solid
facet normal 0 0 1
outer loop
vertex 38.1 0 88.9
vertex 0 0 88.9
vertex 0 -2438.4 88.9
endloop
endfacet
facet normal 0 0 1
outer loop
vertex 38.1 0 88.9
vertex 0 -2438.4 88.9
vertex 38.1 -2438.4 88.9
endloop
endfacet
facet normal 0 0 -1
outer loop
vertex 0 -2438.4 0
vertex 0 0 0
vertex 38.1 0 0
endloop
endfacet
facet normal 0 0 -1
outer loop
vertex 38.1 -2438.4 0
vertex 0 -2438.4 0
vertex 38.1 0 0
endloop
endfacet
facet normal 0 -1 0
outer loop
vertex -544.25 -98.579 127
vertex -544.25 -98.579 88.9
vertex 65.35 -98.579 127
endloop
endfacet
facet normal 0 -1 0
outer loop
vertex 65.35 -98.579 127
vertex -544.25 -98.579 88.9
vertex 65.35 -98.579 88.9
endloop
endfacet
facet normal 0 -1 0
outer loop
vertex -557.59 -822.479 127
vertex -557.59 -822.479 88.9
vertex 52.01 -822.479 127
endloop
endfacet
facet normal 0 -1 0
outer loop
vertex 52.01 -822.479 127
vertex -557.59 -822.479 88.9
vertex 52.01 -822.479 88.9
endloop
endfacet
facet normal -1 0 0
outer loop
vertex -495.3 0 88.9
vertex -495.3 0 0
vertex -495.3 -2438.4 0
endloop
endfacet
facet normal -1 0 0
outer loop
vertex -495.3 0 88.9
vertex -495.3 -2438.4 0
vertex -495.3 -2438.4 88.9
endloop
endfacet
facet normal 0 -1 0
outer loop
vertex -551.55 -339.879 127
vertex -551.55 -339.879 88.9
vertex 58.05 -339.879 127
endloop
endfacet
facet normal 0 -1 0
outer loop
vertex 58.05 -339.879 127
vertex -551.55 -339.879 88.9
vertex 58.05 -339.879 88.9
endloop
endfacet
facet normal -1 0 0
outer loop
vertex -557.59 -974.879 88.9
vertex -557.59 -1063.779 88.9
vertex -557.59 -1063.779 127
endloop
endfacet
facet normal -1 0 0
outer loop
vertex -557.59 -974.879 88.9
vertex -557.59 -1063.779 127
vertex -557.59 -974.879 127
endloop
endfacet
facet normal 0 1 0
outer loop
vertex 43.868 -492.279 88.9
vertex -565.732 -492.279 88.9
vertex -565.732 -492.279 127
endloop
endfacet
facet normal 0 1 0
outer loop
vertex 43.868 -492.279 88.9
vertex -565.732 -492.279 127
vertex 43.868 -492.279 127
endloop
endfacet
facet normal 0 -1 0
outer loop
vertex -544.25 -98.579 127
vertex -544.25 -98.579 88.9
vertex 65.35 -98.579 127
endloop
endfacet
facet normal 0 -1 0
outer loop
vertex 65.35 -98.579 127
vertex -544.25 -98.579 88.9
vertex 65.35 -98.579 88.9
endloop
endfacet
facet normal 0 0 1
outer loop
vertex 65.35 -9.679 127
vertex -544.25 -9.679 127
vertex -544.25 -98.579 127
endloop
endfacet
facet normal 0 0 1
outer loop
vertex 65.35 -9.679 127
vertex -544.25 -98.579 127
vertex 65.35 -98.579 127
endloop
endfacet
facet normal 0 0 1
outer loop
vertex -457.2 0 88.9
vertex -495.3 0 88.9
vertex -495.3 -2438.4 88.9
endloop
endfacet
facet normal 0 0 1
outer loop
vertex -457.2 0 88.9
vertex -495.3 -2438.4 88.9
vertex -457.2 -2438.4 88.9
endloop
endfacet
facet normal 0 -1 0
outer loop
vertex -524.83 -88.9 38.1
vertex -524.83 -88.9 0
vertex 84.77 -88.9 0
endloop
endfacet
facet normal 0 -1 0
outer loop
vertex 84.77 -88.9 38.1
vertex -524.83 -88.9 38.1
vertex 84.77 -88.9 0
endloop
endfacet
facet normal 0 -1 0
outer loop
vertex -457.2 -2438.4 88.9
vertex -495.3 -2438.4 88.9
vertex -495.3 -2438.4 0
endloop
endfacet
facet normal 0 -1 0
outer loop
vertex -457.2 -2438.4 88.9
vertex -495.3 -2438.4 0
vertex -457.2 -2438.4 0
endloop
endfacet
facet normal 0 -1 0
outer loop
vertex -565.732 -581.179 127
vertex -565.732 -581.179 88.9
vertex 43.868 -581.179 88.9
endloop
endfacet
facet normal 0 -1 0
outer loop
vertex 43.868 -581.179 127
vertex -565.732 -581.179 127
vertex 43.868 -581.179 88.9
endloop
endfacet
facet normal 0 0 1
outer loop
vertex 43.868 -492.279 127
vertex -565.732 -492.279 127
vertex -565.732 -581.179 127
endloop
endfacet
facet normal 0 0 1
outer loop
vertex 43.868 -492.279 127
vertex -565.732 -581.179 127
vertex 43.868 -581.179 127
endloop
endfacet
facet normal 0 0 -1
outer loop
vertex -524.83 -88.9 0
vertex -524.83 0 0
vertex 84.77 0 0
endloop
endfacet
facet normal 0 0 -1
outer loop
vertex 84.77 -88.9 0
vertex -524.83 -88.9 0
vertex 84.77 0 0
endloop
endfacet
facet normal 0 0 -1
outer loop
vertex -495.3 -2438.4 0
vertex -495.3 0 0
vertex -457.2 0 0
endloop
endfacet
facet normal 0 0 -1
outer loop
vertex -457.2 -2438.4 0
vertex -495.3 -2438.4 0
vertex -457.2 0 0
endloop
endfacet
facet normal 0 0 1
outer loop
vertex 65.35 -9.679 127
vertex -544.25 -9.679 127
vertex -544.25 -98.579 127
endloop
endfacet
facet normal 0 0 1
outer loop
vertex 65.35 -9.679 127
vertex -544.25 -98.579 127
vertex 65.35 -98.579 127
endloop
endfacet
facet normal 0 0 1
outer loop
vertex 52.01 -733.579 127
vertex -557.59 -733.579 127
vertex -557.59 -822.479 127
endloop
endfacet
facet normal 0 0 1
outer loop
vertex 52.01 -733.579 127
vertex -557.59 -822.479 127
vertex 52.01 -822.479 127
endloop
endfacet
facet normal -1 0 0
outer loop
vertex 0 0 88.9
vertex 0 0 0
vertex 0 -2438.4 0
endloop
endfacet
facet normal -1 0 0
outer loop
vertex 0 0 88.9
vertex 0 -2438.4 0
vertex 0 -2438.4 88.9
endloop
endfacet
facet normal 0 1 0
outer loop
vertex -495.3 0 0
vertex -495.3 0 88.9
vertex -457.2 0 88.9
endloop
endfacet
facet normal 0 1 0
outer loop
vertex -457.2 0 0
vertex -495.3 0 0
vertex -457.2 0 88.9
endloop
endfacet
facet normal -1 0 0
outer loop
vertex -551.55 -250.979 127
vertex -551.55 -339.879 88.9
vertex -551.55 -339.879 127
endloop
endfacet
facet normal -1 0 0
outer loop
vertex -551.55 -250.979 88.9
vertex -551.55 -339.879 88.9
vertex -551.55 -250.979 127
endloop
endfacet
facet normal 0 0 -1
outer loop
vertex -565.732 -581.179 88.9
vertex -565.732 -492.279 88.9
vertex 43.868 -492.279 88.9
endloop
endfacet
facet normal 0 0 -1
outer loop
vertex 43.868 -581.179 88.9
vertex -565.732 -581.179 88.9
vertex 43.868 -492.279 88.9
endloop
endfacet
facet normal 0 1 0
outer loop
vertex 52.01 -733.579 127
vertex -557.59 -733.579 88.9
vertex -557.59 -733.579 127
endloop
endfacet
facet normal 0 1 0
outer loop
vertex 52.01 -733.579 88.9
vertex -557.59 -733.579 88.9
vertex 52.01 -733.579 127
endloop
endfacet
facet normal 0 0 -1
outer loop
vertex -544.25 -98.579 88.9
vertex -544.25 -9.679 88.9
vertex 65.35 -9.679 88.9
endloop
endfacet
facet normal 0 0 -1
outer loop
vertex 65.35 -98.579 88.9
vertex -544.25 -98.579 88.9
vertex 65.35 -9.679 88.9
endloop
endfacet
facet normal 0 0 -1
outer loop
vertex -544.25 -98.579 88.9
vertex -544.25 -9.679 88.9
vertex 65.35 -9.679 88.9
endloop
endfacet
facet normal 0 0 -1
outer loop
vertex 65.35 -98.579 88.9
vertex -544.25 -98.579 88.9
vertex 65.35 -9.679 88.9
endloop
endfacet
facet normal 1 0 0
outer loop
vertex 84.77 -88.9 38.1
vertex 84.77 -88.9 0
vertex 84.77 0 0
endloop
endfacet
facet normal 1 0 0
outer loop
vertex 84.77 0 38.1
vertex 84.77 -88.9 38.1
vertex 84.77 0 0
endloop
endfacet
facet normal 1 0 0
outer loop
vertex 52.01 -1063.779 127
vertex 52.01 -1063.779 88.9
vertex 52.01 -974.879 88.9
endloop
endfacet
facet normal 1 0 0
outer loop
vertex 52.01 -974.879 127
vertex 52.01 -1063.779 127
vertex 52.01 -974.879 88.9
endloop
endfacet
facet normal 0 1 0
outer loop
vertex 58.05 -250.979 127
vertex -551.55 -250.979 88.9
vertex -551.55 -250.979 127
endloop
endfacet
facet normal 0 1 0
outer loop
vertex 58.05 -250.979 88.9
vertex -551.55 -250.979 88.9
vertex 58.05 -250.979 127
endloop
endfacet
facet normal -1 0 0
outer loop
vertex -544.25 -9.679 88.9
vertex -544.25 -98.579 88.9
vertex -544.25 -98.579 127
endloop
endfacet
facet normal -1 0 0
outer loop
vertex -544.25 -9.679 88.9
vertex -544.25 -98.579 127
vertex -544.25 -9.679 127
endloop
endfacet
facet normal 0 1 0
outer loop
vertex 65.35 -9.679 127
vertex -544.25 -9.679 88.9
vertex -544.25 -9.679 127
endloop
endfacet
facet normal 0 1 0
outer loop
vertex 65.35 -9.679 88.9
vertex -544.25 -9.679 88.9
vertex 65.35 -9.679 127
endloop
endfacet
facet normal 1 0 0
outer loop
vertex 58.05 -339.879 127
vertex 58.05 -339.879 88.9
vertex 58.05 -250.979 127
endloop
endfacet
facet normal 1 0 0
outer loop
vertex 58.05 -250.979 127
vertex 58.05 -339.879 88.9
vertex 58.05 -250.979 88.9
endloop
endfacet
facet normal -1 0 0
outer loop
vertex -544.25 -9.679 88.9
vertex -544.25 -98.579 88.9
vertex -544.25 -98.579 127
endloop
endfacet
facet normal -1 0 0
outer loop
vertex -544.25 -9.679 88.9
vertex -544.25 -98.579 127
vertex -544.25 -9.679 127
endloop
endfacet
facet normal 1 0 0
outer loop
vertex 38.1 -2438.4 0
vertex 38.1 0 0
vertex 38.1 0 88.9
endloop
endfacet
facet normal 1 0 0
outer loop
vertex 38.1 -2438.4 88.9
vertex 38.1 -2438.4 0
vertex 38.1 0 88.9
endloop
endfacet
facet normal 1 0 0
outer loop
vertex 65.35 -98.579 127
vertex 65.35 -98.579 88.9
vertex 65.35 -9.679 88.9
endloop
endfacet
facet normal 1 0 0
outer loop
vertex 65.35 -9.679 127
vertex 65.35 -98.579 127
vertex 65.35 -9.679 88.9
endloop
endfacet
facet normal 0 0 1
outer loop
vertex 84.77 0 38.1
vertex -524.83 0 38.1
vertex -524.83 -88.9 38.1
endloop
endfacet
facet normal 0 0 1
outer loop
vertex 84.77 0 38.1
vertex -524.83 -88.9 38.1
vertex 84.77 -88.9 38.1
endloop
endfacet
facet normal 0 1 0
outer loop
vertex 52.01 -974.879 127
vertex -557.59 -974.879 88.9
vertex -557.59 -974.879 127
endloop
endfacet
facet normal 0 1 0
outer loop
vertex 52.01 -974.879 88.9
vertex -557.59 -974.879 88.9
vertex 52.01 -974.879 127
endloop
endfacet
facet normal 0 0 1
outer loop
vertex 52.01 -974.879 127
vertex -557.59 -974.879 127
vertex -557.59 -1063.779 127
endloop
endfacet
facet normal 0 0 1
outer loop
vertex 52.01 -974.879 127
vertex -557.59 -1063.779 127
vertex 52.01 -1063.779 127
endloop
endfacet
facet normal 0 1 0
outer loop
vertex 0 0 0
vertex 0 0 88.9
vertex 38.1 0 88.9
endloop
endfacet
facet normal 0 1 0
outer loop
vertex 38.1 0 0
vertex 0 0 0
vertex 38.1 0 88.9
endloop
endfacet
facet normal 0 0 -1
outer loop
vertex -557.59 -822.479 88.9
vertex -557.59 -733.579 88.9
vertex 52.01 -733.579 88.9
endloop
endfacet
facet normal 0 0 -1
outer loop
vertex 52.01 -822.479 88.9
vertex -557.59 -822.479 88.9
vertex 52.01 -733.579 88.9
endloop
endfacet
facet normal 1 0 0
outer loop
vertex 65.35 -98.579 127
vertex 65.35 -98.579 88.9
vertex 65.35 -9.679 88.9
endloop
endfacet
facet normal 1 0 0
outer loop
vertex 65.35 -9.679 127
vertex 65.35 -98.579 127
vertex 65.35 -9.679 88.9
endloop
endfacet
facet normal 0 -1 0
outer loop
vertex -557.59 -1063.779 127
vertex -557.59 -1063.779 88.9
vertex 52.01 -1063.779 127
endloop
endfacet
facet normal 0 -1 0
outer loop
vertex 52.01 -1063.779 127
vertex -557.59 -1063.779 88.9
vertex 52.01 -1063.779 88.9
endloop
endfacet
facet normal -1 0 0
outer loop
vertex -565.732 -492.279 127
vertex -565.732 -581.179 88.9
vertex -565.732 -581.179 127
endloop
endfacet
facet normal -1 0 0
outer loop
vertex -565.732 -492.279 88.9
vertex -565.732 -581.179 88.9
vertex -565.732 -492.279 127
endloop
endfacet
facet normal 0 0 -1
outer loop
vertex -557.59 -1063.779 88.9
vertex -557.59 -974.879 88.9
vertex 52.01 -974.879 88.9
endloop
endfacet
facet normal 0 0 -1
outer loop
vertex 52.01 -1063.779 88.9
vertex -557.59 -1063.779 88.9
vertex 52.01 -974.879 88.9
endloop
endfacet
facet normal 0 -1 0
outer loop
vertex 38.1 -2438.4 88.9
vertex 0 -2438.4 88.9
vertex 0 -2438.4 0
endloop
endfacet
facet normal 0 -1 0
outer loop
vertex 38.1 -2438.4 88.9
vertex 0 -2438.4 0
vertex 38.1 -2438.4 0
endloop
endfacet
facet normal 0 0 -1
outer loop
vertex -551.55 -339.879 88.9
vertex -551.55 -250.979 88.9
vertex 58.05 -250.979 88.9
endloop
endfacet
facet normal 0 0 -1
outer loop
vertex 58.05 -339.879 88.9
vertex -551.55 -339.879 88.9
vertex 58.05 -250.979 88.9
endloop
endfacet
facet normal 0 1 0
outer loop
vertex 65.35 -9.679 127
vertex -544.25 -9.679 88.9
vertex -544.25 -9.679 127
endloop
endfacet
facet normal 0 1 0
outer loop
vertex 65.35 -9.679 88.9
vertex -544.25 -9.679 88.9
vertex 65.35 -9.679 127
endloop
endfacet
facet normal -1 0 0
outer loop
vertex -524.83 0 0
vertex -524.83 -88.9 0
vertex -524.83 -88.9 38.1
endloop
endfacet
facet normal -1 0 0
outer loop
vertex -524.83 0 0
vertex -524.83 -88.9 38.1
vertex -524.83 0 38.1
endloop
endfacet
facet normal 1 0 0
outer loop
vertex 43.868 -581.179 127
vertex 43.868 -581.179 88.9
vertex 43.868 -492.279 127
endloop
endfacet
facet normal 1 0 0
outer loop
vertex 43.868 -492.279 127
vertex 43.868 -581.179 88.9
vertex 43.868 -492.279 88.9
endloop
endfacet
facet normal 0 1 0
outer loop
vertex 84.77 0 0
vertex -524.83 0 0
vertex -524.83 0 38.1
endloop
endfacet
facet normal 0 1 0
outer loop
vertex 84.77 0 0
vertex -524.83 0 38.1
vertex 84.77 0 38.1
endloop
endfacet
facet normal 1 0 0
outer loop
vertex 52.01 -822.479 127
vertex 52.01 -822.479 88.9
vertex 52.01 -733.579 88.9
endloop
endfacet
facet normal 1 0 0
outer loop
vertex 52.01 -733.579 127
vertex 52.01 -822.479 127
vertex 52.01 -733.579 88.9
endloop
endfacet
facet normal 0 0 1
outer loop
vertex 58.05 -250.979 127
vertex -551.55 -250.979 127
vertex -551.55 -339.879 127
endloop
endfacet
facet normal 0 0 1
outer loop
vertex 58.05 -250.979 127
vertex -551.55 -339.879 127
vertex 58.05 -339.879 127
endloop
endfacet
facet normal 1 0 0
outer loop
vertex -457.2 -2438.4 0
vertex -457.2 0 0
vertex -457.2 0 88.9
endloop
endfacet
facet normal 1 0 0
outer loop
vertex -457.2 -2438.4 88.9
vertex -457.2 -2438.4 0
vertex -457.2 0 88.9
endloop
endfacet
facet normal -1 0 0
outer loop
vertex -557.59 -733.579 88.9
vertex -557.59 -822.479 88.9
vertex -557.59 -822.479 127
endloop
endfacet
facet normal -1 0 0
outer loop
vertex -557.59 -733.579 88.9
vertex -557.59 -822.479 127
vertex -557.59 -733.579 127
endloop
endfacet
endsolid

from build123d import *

# Parameters (mm, degrees)
F0_W     = 38.1
F0_H     = 88.9
F1_DEPTH = 2438.4
F2_DEPTH = 2438.4
F3_W     = 609.6
F3_H     = 88.9
F4_DEPTH = 38.1
F6_W     = 609.6
F6_H     = 88.9
F7_DEPTH = 38.1
F8_DEPTH = 38.1


with BuildPart() as f1:
    # F0 (on Front) → F1 (new body)
    with BuildSketch(Plane.XZ):
        with Locations((-476.25, 44.45)):
            Rectangle(F0_W, F0_H)
    extrude(amount=F1_DEPTH)


with BuildPart() as f2:
    # F0 (on Front) → F2 (new body)
    with BuildSketch(Plane.XZ):
        with Locations((19.05, 44.45)):
            Rectangle(F0_W, F0_H)
    extrude(amount=F2_DEPTH)


with BuildPart() as f4:
    # F3 (on Top) → F4 (new body)
    with BuildSketch(Plane.XY):
        with Locations((-220.0298877354, -44.45)):
            Rectangle(F3_W, F3_H)
    extrude(amount=F4_DEPTH)


with BuildPart() as f7:
    # F6 (on offset) → F7 (new body)
    with BuildSketch(Plane.XY.offset(88.9)):
        with Locations((-239.4500577484, -54.1293804169)):
            Rectangle(F6_W, F6_H)
    extrude(amount=F7_DEPTH)


with BuildPart() as f8:
    # F6 (on offset) → F8 (new body)
    with BuildSketch(Plane.XY.offset(88.9)):
        with Locations((-239.4500577484, -54.1293804169)):
            Rectangle(F6_W, F6_H)
    extrude(amount=F8_DEPTH)


with BuildPart() as f8b:
    # F6 (on offset) → F8, piece 2 (new body)
    with BuildSketch(Plane.XY.offset(88.9)):
        with Locations((-246.7503883362, -295.4293804169)):
            Rectangle(F6_W, F6_H)
    extrude(amount=F8_DEPTH)


with BuildPart() as f8c:
    # F6 (on offset) → F8, piece 3 (new body)
    with BuildSketch(Plane.XY.offset(88.9)):
        with Locations((-260.9323598862, -536.7293804169)):
            Rectangle(F6_W, F6_H)
    extrude(amount=F8_DEPTH)


with BuildPart() as f8d:
    # F6 (on offset) → F8, piece 4 (new body)
    with BuildSketch(Plane.XY.offset(88.9)):
        with Locations((-252.7901269913, -778.0293804169)):
            Rectangle(F6_W, F6_H)
    extrude(amount=F8_DEPTH)


with BuildPart() as f8e:
    # F6 (on offset) → F8, piece 5 (new body)
    with BuildSketch(Plane.XY.offset(88.9)):
        with Locations((-252.7901269913, -1019.3293804169)):
            Rectangle(F6_W, F6_H)
    extrude(amount=F8_DEPTH)


solid = Compound([f1.part, f2.part, f4.part, f7.part, f8.part, f8b.part, f8c.part, f8d.part, f8e.part])
